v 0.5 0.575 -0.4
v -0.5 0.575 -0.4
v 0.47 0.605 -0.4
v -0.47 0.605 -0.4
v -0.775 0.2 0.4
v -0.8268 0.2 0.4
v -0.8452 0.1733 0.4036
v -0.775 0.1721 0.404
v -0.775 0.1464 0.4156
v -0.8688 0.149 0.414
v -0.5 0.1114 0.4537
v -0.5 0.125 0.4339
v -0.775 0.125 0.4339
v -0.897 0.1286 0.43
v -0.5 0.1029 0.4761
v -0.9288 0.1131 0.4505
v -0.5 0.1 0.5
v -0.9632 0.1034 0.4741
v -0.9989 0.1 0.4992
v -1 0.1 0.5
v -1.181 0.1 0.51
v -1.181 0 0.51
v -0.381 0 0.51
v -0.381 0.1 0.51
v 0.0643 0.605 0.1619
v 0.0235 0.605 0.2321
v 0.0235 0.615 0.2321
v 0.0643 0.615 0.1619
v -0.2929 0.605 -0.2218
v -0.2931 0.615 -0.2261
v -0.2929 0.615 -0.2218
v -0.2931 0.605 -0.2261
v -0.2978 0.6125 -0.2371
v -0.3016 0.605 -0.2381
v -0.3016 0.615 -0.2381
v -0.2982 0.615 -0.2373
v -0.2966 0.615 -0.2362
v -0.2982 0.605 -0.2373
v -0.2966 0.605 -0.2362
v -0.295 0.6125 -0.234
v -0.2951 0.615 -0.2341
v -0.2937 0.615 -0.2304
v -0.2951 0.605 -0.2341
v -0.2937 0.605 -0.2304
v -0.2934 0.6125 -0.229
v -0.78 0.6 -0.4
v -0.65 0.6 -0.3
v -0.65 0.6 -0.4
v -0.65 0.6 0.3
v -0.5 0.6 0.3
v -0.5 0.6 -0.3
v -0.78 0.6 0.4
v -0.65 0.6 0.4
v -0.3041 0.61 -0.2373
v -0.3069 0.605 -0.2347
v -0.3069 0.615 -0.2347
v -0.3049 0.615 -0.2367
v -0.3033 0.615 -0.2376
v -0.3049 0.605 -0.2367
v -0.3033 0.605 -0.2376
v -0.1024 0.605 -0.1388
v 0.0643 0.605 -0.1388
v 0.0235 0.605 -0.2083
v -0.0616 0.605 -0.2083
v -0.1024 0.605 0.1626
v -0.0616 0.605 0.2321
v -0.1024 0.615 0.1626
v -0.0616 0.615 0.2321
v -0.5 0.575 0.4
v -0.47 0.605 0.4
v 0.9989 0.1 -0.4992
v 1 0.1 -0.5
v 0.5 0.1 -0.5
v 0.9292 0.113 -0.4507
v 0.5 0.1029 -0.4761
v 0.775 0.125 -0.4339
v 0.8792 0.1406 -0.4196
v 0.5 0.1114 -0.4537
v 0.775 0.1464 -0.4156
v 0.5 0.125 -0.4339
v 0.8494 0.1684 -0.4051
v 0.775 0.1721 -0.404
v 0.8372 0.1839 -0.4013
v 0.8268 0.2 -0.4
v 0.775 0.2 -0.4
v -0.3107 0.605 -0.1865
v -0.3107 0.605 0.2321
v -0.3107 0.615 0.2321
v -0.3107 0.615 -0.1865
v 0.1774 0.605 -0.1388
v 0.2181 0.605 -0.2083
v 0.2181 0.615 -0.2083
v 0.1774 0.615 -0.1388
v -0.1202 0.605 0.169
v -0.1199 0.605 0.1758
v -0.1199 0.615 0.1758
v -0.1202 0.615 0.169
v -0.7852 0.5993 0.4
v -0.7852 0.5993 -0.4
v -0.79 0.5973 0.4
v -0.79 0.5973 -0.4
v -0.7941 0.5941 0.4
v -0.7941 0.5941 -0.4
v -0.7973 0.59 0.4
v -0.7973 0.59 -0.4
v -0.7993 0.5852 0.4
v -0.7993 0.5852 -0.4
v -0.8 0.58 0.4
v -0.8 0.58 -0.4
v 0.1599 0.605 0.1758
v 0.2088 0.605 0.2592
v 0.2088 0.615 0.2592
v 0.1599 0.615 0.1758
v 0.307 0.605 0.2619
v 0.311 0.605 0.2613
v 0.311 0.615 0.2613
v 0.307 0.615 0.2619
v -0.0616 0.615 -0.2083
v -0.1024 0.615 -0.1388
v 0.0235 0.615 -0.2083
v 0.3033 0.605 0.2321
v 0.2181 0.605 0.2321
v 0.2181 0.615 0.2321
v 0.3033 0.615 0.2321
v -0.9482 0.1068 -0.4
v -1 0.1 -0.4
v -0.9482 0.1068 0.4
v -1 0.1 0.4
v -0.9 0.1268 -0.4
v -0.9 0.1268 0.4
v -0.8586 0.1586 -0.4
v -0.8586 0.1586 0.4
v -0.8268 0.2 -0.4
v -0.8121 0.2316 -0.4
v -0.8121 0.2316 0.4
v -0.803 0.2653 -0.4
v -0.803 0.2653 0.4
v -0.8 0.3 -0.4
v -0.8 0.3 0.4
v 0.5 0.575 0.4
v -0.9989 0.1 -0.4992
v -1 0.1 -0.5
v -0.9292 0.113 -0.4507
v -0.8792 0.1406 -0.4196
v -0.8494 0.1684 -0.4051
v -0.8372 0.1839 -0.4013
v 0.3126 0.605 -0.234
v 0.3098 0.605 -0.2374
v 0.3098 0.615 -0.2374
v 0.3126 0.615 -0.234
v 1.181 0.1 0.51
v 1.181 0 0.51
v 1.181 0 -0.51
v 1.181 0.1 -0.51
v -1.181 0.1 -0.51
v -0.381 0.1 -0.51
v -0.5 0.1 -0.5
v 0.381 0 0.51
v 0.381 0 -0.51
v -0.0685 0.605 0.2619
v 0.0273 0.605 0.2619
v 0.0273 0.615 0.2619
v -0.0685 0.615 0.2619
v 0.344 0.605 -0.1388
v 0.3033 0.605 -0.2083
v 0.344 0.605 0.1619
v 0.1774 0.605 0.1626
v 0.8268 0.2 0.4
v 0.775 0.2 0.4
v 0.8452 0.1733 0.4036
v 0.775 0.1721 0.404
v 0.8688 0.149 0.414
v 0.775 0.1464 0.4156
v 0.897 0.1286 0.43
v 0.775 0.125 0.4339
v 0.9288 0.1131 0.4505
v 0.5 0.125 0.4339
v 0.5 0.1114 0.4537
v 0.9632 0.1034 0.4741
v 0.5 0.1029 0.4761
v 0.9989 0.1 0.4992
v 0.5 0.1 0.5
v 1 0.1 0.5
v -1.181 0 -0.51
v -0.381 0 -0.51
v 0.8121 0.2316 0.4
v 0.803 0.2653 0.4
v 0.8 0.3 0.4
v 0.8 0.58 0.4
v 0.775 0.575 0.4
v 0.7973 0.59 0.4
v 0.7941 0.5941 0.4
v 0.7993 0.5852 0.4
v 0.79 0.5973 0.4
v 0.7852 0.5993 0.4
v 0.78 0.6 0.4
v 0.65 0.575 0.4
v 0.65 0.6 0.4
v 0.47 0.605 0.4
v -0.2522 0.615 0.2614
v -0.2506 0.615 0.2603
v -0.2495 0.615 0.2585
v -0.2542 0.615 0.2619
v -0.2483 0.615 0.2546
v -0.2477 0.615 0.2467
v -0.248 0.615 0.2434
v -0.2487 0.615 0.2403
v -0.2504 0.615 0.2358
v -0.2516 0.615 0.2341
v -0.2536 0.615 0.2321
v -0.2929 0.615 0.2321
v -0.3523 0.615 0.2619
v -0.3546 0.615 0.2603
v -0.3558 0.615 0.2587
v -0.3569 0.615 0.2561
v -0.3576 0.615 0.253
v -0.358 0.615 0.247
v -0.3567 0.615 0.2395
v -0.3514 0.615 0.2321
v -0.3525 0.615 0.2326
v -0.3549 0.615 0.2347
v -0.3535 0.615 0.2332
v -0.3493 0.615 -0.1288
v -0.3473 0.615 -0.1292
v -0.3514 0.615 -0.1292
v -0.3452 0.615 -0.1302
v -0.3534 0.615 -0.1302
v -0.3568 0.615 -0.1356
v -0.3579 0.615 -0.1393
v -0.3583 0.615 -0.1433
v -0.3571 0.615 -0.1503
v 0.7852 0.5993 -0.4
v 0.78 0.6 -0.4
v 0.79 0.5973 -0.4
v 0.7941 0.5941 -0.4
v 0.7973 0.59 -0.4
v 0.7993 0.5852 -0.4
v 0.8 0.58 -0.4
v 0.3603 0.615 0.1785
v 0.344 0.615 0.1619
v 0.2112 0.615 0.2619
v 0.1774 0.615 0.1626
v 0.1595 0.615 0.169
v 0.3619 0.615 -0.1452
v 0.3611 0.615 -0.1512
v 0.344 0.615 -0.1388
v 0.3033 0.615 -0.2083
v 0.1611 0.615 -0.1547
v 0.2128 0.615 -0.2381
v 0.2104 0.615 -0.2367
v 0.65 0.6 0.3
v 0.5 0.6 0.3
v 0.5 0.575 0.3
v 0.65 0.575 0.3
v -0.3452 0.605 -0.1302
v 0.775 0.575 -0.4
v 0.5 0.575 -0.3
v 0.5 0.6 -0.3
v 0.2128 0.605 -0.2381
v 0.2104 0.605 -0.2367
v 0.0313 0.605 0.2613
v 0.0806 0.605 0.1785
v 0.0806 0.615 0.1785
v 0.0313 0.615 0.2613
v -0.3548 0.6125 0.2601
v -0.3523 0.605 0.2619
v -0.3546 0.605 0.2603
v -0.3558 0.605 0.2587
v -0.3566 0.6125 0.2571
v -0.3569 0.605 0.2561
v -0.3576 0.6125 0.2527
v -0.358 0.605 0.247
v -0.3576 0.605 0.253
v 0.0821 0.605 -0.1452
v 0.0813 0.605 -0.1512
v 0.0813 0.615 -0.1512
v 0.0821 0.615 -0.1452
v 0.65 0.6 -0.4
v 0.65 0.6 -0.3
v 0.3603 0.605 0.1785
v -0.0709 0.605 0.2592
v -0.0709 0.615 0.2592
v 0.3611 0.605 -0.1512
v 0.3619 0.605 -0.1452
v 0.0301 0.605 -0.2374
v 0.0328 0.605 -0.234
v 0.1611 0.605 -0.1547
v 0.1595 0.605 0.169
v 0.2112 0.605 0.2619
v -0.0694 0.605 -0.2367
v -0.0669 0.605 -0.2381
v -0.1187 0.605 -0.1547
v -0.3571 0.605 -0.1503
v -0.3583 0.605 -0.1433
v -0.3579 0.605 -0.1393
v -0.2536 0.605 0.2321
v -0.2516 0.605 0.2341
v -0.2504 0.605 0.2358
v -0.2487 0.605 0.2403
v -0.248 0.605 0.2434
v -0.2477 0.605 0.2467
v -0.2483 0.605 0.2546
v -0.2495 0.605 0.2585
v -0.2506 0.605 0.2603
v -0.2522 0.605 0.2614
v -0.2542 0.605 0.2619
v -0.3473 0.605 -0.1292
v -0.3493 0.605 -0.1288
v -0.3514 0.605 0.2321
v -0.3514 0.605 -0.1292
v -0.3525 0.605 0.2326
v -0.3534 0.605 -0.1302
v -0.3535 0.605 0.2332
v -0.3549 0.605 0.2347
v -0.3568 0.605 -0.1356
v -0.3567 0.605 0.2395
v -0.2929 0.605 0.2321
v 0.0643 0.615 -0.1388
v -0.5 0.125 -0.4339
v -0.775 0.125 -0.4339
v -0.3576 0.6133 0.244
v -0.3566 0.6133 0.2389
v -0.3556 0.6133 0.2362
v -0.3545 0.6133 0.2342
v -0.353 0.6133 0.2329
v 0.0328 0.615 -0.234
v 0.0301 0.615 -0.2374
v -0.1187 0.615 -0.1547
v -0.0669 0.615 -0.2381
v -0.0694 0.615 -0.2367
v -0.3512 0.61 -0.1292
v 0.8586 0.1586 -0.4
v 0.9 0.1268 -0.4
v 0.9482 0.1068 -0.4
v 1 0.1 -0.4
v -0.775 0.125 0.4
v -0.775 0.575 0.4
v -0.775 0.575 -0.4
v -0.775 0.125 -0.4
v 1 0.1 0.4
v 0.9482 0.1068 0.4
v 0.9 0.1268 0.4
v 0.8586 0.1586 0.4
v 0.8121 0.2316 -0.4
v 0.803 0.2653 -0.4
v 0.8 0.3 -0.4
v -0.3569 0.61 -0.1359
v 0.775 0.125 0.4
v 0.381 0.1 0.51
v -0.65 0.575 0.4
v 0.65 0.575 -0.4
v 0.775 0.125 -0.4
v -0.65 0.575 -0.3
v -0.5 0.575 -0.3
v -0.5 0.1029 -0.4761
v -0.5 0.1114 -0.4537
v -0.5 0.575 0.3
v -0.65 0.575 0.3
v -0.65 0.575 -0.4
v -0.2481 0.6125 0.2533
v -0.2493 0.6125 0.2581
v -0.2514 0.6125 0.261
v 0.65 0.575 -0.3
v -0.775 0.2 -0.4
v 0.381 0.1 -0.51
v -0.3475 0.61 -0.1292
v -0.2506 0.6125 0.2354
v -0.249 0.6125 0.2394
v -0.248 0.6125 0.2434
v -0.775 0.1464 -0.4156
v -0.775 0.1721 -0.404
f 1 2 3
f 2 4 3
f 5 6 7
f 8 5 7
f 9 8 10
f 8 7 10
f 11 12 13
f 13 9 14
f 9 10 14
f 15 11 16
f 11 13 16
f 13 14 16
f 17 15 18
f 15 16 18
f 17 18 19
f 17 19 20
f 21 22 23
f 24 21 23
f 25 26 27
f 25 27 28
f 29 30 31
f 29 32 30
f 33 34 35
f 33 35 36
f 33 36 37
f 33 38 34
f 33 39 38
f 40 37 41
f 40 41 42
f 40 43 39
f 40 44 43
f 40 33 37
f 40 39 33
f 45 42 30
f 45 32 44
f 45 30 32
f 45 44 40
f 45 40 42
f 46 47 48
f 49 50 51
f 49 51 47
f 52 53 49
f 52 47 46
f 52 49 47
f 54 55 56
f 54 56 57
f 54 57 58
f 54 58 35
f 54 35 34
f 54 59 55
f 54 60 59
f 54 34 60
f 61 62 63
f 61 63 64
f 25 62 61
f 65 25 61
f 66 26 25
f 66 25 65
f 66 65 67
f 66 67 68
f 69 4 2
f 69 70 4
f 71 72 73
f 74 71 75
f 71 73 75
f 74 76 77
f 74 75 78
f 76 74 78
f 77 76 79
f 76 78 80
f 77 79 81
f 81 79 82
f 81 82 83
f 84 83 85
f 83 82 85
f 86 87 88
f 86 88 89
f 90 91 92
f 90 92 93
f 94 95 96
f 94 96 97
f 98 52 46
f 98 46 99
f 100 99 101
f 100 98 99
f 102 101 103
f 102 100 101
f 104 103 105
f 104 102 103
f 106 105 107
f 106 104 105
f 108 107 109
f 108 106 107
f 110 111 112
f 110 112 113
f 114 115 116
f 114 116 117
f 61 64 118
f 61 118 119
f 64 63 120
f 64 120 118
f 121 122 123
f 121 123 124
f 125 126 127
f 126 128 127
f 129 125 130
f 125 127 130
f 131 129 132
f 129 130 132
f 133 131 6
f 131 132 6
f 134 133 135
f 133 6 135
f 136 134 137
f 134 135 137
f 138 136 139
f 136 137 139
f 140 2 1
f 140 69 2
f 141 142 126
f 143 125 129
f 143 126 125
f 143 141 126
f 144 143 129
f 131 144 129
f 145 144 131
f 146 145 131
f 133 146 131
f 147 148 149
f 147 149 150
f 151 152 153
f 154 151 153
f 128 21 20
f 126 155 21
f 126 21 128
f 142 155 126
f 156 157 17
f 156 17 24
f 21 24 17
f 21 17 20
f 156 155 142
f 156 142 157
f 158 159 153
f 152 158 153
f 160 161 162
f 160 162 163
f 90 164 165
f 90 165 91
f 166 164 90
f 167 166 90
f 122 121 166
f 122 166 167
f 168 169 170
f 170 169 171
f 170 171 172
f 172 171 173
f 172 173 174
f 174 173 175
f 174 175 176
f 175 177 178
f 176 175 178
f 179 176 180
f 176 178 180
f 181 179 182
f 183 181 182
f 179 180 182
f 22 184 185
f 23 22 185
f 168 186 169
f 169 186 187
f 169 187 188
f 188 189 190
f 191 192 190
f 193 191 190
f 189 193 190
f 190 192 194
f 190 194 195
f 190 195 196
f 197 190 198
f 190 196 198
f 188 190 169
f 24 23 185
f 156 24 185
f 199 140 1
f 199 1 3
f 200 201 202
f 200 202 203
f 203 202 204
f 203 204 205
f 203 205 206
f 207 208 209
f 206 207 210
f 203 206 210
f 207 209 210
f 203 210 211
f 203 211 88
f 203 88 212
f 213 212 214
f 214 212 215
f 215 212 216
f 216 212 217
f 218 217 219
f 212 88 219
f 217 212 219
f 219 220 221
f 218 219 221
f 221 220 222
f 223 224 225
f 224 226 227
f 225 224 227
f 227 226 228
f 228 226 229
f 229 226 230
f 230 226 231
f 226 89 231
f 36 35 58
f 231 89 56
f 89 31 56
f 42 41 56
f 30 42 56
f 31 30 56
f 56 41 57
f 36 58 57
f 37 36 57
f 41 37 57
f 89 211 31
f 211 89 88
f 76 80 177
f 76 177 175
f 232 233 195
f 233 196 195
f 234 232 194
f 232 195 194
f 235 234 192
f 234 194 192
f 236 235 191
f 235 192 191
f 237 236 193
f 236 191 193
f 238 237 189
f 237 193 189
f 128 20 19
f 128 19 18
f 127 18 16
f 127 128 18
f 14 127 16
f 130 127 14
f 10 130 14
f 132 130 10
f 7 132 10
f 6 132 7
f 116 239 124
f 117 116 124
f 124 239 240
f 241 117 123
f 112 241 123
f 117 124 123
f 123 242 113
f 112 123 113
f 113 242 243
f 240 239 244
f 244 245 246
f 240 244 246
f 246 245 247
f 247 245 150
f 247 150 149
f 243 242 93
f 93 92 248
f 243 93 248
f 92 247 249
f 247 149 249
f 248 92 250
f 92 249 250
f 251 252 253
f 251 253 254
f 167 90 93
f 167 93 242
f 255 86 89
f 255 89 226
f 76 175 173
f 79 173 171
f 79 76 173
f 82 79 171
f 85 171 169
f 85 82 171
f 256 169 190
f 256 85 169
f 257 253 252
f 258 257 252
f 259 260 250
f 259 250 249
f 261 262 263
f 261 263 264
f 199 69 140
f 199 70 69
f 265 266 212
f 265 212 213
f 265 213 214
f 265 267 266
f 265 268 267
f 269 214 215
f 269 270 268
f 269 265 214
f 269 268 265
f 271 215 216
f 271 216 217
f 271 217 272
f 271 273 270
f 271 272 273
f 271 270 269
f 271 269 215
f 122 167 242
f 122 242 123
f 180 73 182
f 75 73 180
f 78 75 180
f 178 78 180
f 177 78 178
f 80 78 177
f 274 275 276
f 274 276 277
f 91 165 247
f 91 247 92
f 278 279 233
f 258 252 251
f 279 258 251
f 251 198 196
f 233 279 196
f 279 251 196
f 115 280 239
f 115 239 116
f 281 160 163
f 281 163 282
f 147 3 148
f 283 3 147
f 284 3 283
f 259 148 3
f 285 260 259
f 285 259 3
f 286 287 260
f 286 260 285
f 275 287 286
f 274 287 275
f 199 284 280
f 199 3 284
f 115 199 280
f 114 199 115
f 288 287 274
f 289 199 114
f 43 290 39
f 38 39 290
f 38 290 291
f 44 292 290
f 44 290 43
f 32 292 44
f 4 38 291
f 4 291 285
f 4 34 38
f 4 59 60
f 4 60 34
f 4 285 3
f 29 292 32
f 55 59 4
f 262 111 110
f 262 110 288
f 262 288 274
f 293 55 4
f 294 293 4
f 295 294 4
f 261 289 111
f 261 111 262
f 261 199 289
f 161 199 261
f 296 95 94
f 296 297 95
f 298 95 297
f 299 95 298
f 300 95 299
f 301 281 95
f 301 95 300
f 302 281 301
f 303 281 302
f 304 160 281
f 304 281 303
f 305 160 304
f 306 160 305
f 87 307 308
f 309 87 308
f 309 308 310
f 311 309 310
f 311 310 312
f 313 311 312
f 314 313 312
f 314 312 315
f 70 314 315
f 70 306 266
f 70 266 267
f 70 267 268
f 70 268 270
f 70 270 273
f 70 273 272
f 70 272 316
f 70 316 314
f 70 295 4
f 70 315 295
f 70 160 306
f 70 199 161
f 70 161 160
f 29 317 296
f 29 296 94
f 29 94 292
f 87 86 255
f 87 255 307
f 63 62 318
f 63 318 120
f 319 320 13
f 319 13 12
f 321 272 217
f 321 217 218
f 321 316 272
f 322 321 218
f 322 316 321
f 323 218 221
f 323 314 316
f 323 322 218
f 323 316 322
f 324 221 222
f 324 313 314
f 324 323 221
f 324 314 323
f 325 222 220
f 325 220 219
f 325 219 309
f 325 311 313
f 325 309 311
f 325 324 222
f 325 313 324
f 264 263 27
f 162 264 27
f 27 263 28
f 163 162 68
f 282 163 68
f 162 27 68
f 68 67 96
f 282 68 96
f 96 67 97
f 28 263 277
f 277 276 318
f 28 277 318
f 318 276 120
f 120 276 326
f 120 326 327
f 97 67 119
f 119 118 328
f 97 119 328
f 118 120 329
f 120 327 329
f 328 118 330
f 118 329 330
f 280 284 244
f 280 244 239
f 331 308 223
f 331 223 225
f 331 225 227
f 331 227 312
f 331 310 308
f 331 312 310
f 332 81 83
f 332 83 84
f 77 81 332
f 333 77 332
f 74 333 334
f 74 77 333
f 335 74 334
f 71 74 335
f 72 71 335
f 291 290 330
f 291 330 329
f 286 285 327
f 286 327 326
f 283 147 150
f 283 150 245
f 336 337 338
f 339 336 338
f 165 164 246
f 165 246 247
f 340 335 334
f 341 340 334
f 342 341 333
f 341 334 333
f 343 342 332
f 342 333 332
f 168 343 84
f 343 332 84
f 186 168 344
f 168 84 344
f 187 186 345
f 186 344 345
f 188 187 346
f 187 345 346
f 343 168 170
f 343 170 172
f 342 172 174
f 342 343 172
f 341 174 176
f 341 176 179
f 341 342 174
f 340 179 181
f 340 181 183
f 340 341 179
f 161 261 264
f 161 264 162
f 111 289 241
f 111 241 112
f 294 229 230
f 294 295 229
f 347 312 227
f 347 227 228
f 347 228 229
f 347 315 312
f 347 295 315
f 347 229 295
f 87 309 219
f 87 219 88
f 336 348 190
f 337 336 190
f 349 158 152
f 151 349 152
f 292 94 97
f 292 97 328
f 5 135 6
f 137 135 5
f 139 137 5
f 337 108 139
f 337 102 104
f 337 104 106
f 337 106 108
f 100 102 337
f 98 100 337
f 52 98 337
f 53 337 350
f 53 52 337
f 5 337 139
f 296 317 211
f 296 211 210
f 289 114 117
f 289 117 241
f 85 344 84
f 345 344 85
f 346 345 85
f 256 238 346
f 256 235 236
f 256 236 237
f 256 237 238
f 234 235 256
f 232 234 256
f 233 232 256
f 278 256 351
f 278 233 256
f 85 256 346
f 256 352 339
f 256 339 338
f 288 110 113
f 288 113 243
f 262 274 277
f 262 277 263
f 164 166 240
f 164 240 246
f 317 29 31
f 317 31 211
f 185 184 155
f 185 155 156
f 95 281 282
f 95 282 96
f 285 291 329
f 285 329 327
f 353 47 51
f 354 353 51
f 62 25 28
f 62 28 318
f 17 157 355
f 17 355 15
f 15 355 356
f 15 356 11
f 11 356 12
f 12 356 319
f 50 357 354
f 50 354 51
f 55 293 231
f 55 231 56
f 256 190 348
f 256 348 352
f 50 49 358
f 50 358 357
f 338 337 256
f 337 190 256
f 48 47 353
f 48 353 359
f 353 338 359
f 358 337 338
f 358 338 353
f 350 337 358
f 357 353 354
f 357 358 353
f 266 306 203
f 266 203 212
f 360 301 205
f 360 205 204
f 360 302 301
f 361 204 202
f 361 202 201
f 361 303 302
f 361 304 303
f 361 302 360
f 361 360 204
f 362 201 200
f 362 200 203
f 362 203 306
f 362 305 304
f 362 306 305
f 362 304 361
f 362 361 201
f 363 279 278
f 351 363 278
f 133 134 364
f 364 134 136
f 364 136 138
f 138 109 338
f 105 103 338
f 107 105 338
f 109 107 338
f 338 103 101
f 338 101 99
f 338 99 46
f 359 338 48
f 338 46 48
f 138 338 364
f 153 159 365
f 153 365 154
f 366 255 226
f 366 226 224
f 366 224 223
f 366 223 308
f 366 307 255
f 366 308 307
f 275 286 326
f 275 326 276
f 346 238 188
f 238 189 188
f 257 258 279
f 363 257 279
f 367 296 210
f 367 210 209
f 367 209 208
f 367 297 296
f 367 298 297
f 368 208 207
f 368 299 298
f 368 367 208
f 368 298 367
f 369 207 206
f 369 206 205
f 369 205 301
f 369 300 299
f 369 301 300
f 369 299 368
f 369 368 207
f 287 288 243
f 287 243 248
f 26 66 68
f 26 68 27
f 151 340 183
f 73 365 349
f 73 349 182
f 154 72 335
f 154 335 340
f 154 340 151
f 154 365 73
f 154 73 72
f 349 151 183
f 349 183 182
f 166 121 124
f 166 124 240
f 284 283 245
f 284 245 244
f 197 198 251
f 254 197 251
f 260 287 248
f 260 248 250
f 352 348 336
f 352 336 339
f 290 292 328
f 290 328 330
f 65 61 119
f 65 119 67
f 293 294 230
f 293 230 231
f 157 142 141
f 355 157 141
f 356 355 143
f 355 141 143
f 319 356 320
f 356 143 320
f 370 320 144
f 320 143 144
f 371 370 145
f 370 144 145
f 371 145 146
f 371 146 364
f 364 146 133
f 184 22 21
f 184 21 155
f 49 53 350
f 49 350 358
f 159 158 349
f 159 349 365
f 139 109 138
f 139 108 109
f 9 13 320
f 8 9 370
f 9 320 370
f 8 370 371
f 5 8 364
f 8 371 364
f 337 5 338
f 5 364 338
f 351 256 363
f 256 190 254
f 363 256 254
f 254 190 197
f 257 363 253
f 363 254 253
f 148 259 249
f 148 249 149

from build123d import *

# Parameters (mm, degrees)
SKETCH1_W             = 0.8
SKETCH1_H             = 0.45
BOSS_EXTRUDE1_DEPTH   = 0.775
BOSS_EXTRUDE2_DEPTH   = 0.4
BOSS_EXTRUDE2_2_DEPTH = 0.4
SKETCH3_W             = 0.15
SKETCH3_H             = 0.1
CUT_EXTRUDE1_DEPTH    = 0.025
BOSS_EXTRUDE3_DEPTH   = 0.4
BOSS_EXTRUDE4_DEPTH   = 0.01
SKETCH7_W             = 0.8
SKETCH7_H             = 1.02
BOSS_EXTRUDE5_DEPTH   = 0.1
FILLET3_R             = 0.2
FILLET4_R             = 0.2
FILLET5_R             = 0.1
FILLET6_R             = 0.1


with BuildPart() as part:
    # Sketch1 → Boss-Extrude1 (new, symmetric)
    with BuildSketch(Plane(origin=(0, 0, 0), x_dir=(0, 0, -1), z_dir=(1, 0, 0))):
        with Locations((0, 0.35)):
            Rectangle(SKETCH1_W, SKETCH1_H)
    extrude(amount=BOSS_EXTRUDE1_DEPTH, both=True)


with BuildPart() as body_2:
    # Sketch2 → Boss-Extrude2 (new, symmetric)
    with BuildSketch(Plane.XY):
        with BuildLine():
            Line((-0.5, 0.6), (-0.78, 0.6))
            ThreePointArc((-0.78, 0.6), (-0.794142136, 0.594142136), (-0.8, 0.58))
            Line((-0.8, 0.58), (-0.8, 0.1))
            Line((-0.8, 0.1), (-0.5, 0.1))
            Line((-0.5, 0.1), (-0.5, 0.125))
            Line((-0.5, 0.125), (-0.775, 0.125))
            Line((-0.775, 0.125), (-0.775, 0.575))
            Line((-0.775, 0.575), (-0.5, 0.575))
            Line((-0.5, 0.575), (-0.5, 0.6))
        make_face()
    extrude(amount=BOSS_EXTRUDE2_DEPTH, both=True)


with BuildPart() as body_3:
    # Sketch2 → Boss-Extrude2 2 (new, symmetric)
    with BuildSketch(Plane.XY):
        with BuildLine():
            Line((0.5, 0.575), (0.5, 0.6))
            Line((0.5, 0.6), (0.78, 0.6))
            ThreePointArc((0.78, 0.6), (0.794142136, 0.594142136), (0.8, 0.58))
            Line((0.8, 0.58), (0.8, 0.1))
            Line((0.8, 0.1), (0.5, 0.1))
            Line((0.5, 0.1), (0.5, 0.125))
            Line((0.5, 0.125), (0.775, 0.125))
            Line((0.775, 0.125), (0.775, 0.575))
            Line((0.775, 0.575), (0.5, 0.575))
        make_face()
    extrude(amount=BOSS_EXTRUDE2_2_DEPTH, both=True)


with BuildPart() as cut_extrude1_tool:
    # Sketch3 → Cut-Extrude1 (new body)
    with BuildSketch(Plane(origin=(0, 0.6, 0), x_dir=(1, 0, 0), z_dir=(0, 1, 0))):
        with Locations((-0.575, 0.35)):
            Rectangle(SKETCH3_W, SKETCH3_H)
        with Locations((-0.575, -0.35)):
            Rectangle(SKETCH3_W, SKETCH3_H)
        with Locations((0.575, -0.35)):
            Rectangle(SKETCH3_W, SKETCH3_H)
        with Locations((0.575, 0.35)):
            Rectangle(SKETCH3_W, SKETCH3_H)
    extrude(amount=-CUT_EXTRUDE1_DEPTH)


with BuildPart() as body_2_1:
    add(body_2.part)

    # Cut-Extrude1: cut by cut_extrude1_tool
    add(cut_extrude1_tool.part, mode=Mode.SUBTRACT)



with BuildPart() as body_3_1:
    add(body_3.part)

    # Cut-Extrude1: cut by cut_extrude1_tool
    add(cut_extrude1_tool.part, mode=Mode.SUBTRACT)


with BuildPart() as body_4:
    # Sketch4 → Boss-Extrude3 (new, symmetric)
    with BuildSketch(Plane.XY):
        Polygon((-0.5, 0.575), (0.5, 0.575), (0.47, 0.605), (-0.47, 0.605), align=None)
    extrude(amount=BOSS_EXTRUDE3_DEPTH, both=True)

    # Sketch6 → Boss-Extrude4 (add)
    # profile 1 of 3: a face of its own
    with BuildSketch(Plane(origin=(0, 0.605, 0), x_dir=(1, 0, 0), z_dir=(0, 1, 0))):
        with BuildLine():
            Line((-0.292857143, 0.221819196), (-0.292857143, -0.232142857))
            Line((-0.292857143, -0.232142857), (-0.253608631, -0.232142857))
            add(Edge.make_bspline(
                [(-0.253608631, -0.232142857), (-0.252514915, -0.233159523), (-0.250346122, -0.235175528), (-0.248921239, -0.239323698), (-0.247952001, -0.243100354), (-0.24781151, -0.245561302), (-0.247749256, -0.246651786)],
                knots=[0, 0, 0, 0, 1.094507773, 2.170363376, 3.18925981, 4, 4, 4, 4], degree=3))
            add(Edge.make_bspline(
                [(-0.247749256, -0.246651786), (-0.247790011, -0.24890061), (-0.247860511, -0.252790757), (-0.248927629, -0.257670974), (-0.250957131, -0.261266063), (-0.253164339, -0.261705298), (-0.254166667, -0.261904762)],
                knots=[0, 0, 0, 0, 1.483935822, 2.566997854, 3.349251094, 4, 4, 4, 4], degree=3))
            Line((-0.254166667, -0.261904762), (-0.352287946, -0.261904762))
            add(Edge.make_bspline(
                [(-0.352287946, -0.261904762), (-0.353191845, -0.261383497), (-0.355138277, -0.260261018), (-0.356845026, -0.256793507), (-0.357784968, -0.252323852), (-0.357898096, -0.248923727), (-0.35796131, -0.24702381)],
                knots=[0, 0, 0, 0, 0.731657516, 1.575533429, 2.645259425, 4, 4, 4, 4], degree=3))
            add(Edge.make_bspline(
                [(-0.35796131, -0.24702381), (-0.357847061, -0.245999991), (-0.357543408, -0.24327885), (-0.356855684, -0.239634421), (-0.355750939, -0.236384481), (-0.354715358, -0.234196716), (-0.35312544, -0.232808963), (-0.351931893, -0.232359173), (-0.351357887, -0.232142857)],
                knots=[0, 0, 0, 0, 1.077846596, 2.864738214, 3.859388994, 4.671949365, 5.361307703, 6, 6, 6, 6], degree=3))
            Line((-0.351357887, -0.232142857), (-0.310714286, -0.232142857))
            Line((-0.310714286, -0.232142857), (-0.310714286, 0.186476935))
            Line((-0.310714286, 0.186476935), (-0.345219494, 0.130208333))
            add(Edge.make_bspline(
                [(-0.345219494, 0.130208333), (-0.34594703, 0.129816395), (-0.34723663, 0.129121662), (-0.348681862, 0.128906863), (-0.349311756, 0.128813244)],
                knots=[0, 0, 0, 0, 1.128313794, 2, 2, 2, 2], degree=3))
            add(Edge.make_bspline(
                [(-0.349311756, 0.128813244), (-0.34994165, 0.128906863), (-0.351386882, 0.129121662), (-0.352676481, 0.129816395), (-0.353404018, 0.130208333)],
                knots=[0, 0, 0, 0, 0.871686206, 2, 2, 2, 2], degree=3))
            add(Edge.make_bspline(
                [(-0.353404018, 0.130208333), (-0.354762035, 0.132029405), (-0.357658077, 0.135912935), (-0.35809911, 0.140752164), (-0.358333333, 0.143322173)],
                knots=[0, 0, 0, 0, 0.937843913, 2, 2, 2, 2], degree=3))
            Line((-0.358333333, 0.143322173), (-0.357124256, 0.150297619))
            Line((-0.357124256, 0.150297619), (-0.306901042, 0.234654018))
            add(Edge.make_bspline(
                [(-0.306901042, 0.234654018), (-0.306052725, 0.23565958), (-0.304616067, 0.23736254), (-0.302476074, 0.237882361), (-0.301599702, 0.238095238)],
                knots=[0, 0, 0, 0, 1.180958283, 2, 2, 2, 2], degree=3))
            add(Edge.make_bspline(
                [(-0.301599702, 0.238095238), (-0.300254548, 0.237901979), (-0.297496165, 0.23750568), (-0.29448599, 0.233775342), (-0.293094631, 0.228376002), (-0.292944039, 0.224218313), (-0.292857143, 0.221819196)],
                knots=[0, 0, 0, 0, 0.76869288, 1.576286457, 2.601441333, 4, 4, 4, 4], degree=3))
        make_face()
    # profile 2 of 3: a face of its own
    with BuildSketch(Plane(origin=(0, 0.605, 0), x_dir=(1, 0, 0), z_dir=(0, 1, 0))):
        Polygon((0.032849702, 0.234002976), (0.081305804, 0.151227679), (0.082142857, 0.145182292), (0.080561756, -0.178478423), (0.031268601, -0.26125372), (0.027269345, -0.261904762), (-0.068526786, -0.261904762), (-0.07094494, -0.259207589), (-0.119866071, -0.17578125), (-0.120238095, -0.168991815), (-0.118656994, 0.154668899), (-0.069363839, 0.236700149), (-0.066945685, 0.238095238), (0.030059524, 0.237444196), align=None)
        Polygon((0.064285714, 0.138764881), (0.023549107, 0.208333333), (-0.061644345, 0.208333333), (-0.102380952, 0.138764881), (-0.102380952, -0.162574405), (-0.061644345, -0.232142857), (0.023549107, -0.232142857), (0.064285714, -0.161923363), align=None, mode=Mode.SUBTRACT)
    # profile 3 of 3: a face of its own
    with BuildSketch(Plane(origin=(0, 0.605, 0), x_dir=(1, 0, 0), z_dir=(0, 1, 0))):
        Polygon((0.312611607, 0.234002976), (0.361067708, 0.151227679), (0.361904762, 0.145182292), (0.360323661, -0.178478423), (0.311030506, -0.26125372), (0.30703125, -0.261904762), (0.211235119, -0.261904762), (0.208816964, -0.259207589), (0.159895833, -0.17578125), (0.15952381, -0.168991815), (0.161104911, 0.154668899), (0.210398065, 0.236700149), (0.21281622, 0.238095238), (0.309821429, 0.237444196), align=None)
        Polygon((0.344047619, 0.138764881), (0.303311012, 0.208333333), (0.21811756, 0.208333333), (0.177380952, 0.138764881), (0.177380952, -0.162574405), (0.21811756, -0.232142857), (0.303311012, -0.232142857), (0.344047619, -0.161923363), align=None, mode=Mode.SUBTRACT)
    extrude(amount=BOSS_EXTRUDE4_DEPTH)


with BuildPart() as body_2_2:
    add(body_2_1.part)

    add(body_3_1.part)  # Boss-Extrude5 merges body 3
    # Sketch7 → Boss-Extrude5 (add)
    with BuildSketch(Plane(origin=(0, 0, 0), x_dir=(1, 0, 0), z_dir=(0, 1, 0))):
        with Locations((-0.781, 0)):
            Rectangle(SKETCH7_W, SKETCH7_H)
        with Locations((0.781, 0)):
            Rectangle(SKETCH7_W, SKETCH7_H)
    extrude(amount=BOSS_EXTRUDE5_DEPTH)

    # Fillet3
    fillet3_edges = [body_2_2.edges().sort_by_distance(p)[0] for p in [
        (-0.8, 0.1, 0),
    ]]
    fillet(fillet3_edges, radius=FILLET3_R)

    # Fillet4
    fillet4_edges = [body_2_2.edges().sort_by_distance(p)[0] for p in [
        (0.8, 0.1, 0),
    ]]
    fillet(fillet4_edges, radius=FILLET4_R)

    # Fillet5
    fillet5_edges = [body_2_2.edges().sort_by_distance(p)[0] for p in [
        (0.75, 0.1, 0.4),
    ]]
    fillet(fillet5_edges, radius=FILLET5_R)
    fillet5_2_edges = [body_2_2.edges().sort_by_distance(p)[0] for p in [
        (0.75, 0.1, -0.4),
    ]]
    fillet(fillet5_2_edges, radius=FILLET5_R)

    # Fillet6
    fillet6_edges = [body_2_2.edges().sort_by_distance(p)[0] for p in [
        (-0.75, 0.1, -0.4),
    ]]
    fillet(fillet6_edges, radius=FILLET6_R)
    fillet6_2_edges = [body_2_2.edges().sort_by_distance(p)[0] for p in [
        (-0.75, 0.1, 0.4),
    ]]
    fillet(fillet6_2_edges, radius=FILLET6_R)


solid = Compound([part.part, body_4.part, body_2_2.part])
